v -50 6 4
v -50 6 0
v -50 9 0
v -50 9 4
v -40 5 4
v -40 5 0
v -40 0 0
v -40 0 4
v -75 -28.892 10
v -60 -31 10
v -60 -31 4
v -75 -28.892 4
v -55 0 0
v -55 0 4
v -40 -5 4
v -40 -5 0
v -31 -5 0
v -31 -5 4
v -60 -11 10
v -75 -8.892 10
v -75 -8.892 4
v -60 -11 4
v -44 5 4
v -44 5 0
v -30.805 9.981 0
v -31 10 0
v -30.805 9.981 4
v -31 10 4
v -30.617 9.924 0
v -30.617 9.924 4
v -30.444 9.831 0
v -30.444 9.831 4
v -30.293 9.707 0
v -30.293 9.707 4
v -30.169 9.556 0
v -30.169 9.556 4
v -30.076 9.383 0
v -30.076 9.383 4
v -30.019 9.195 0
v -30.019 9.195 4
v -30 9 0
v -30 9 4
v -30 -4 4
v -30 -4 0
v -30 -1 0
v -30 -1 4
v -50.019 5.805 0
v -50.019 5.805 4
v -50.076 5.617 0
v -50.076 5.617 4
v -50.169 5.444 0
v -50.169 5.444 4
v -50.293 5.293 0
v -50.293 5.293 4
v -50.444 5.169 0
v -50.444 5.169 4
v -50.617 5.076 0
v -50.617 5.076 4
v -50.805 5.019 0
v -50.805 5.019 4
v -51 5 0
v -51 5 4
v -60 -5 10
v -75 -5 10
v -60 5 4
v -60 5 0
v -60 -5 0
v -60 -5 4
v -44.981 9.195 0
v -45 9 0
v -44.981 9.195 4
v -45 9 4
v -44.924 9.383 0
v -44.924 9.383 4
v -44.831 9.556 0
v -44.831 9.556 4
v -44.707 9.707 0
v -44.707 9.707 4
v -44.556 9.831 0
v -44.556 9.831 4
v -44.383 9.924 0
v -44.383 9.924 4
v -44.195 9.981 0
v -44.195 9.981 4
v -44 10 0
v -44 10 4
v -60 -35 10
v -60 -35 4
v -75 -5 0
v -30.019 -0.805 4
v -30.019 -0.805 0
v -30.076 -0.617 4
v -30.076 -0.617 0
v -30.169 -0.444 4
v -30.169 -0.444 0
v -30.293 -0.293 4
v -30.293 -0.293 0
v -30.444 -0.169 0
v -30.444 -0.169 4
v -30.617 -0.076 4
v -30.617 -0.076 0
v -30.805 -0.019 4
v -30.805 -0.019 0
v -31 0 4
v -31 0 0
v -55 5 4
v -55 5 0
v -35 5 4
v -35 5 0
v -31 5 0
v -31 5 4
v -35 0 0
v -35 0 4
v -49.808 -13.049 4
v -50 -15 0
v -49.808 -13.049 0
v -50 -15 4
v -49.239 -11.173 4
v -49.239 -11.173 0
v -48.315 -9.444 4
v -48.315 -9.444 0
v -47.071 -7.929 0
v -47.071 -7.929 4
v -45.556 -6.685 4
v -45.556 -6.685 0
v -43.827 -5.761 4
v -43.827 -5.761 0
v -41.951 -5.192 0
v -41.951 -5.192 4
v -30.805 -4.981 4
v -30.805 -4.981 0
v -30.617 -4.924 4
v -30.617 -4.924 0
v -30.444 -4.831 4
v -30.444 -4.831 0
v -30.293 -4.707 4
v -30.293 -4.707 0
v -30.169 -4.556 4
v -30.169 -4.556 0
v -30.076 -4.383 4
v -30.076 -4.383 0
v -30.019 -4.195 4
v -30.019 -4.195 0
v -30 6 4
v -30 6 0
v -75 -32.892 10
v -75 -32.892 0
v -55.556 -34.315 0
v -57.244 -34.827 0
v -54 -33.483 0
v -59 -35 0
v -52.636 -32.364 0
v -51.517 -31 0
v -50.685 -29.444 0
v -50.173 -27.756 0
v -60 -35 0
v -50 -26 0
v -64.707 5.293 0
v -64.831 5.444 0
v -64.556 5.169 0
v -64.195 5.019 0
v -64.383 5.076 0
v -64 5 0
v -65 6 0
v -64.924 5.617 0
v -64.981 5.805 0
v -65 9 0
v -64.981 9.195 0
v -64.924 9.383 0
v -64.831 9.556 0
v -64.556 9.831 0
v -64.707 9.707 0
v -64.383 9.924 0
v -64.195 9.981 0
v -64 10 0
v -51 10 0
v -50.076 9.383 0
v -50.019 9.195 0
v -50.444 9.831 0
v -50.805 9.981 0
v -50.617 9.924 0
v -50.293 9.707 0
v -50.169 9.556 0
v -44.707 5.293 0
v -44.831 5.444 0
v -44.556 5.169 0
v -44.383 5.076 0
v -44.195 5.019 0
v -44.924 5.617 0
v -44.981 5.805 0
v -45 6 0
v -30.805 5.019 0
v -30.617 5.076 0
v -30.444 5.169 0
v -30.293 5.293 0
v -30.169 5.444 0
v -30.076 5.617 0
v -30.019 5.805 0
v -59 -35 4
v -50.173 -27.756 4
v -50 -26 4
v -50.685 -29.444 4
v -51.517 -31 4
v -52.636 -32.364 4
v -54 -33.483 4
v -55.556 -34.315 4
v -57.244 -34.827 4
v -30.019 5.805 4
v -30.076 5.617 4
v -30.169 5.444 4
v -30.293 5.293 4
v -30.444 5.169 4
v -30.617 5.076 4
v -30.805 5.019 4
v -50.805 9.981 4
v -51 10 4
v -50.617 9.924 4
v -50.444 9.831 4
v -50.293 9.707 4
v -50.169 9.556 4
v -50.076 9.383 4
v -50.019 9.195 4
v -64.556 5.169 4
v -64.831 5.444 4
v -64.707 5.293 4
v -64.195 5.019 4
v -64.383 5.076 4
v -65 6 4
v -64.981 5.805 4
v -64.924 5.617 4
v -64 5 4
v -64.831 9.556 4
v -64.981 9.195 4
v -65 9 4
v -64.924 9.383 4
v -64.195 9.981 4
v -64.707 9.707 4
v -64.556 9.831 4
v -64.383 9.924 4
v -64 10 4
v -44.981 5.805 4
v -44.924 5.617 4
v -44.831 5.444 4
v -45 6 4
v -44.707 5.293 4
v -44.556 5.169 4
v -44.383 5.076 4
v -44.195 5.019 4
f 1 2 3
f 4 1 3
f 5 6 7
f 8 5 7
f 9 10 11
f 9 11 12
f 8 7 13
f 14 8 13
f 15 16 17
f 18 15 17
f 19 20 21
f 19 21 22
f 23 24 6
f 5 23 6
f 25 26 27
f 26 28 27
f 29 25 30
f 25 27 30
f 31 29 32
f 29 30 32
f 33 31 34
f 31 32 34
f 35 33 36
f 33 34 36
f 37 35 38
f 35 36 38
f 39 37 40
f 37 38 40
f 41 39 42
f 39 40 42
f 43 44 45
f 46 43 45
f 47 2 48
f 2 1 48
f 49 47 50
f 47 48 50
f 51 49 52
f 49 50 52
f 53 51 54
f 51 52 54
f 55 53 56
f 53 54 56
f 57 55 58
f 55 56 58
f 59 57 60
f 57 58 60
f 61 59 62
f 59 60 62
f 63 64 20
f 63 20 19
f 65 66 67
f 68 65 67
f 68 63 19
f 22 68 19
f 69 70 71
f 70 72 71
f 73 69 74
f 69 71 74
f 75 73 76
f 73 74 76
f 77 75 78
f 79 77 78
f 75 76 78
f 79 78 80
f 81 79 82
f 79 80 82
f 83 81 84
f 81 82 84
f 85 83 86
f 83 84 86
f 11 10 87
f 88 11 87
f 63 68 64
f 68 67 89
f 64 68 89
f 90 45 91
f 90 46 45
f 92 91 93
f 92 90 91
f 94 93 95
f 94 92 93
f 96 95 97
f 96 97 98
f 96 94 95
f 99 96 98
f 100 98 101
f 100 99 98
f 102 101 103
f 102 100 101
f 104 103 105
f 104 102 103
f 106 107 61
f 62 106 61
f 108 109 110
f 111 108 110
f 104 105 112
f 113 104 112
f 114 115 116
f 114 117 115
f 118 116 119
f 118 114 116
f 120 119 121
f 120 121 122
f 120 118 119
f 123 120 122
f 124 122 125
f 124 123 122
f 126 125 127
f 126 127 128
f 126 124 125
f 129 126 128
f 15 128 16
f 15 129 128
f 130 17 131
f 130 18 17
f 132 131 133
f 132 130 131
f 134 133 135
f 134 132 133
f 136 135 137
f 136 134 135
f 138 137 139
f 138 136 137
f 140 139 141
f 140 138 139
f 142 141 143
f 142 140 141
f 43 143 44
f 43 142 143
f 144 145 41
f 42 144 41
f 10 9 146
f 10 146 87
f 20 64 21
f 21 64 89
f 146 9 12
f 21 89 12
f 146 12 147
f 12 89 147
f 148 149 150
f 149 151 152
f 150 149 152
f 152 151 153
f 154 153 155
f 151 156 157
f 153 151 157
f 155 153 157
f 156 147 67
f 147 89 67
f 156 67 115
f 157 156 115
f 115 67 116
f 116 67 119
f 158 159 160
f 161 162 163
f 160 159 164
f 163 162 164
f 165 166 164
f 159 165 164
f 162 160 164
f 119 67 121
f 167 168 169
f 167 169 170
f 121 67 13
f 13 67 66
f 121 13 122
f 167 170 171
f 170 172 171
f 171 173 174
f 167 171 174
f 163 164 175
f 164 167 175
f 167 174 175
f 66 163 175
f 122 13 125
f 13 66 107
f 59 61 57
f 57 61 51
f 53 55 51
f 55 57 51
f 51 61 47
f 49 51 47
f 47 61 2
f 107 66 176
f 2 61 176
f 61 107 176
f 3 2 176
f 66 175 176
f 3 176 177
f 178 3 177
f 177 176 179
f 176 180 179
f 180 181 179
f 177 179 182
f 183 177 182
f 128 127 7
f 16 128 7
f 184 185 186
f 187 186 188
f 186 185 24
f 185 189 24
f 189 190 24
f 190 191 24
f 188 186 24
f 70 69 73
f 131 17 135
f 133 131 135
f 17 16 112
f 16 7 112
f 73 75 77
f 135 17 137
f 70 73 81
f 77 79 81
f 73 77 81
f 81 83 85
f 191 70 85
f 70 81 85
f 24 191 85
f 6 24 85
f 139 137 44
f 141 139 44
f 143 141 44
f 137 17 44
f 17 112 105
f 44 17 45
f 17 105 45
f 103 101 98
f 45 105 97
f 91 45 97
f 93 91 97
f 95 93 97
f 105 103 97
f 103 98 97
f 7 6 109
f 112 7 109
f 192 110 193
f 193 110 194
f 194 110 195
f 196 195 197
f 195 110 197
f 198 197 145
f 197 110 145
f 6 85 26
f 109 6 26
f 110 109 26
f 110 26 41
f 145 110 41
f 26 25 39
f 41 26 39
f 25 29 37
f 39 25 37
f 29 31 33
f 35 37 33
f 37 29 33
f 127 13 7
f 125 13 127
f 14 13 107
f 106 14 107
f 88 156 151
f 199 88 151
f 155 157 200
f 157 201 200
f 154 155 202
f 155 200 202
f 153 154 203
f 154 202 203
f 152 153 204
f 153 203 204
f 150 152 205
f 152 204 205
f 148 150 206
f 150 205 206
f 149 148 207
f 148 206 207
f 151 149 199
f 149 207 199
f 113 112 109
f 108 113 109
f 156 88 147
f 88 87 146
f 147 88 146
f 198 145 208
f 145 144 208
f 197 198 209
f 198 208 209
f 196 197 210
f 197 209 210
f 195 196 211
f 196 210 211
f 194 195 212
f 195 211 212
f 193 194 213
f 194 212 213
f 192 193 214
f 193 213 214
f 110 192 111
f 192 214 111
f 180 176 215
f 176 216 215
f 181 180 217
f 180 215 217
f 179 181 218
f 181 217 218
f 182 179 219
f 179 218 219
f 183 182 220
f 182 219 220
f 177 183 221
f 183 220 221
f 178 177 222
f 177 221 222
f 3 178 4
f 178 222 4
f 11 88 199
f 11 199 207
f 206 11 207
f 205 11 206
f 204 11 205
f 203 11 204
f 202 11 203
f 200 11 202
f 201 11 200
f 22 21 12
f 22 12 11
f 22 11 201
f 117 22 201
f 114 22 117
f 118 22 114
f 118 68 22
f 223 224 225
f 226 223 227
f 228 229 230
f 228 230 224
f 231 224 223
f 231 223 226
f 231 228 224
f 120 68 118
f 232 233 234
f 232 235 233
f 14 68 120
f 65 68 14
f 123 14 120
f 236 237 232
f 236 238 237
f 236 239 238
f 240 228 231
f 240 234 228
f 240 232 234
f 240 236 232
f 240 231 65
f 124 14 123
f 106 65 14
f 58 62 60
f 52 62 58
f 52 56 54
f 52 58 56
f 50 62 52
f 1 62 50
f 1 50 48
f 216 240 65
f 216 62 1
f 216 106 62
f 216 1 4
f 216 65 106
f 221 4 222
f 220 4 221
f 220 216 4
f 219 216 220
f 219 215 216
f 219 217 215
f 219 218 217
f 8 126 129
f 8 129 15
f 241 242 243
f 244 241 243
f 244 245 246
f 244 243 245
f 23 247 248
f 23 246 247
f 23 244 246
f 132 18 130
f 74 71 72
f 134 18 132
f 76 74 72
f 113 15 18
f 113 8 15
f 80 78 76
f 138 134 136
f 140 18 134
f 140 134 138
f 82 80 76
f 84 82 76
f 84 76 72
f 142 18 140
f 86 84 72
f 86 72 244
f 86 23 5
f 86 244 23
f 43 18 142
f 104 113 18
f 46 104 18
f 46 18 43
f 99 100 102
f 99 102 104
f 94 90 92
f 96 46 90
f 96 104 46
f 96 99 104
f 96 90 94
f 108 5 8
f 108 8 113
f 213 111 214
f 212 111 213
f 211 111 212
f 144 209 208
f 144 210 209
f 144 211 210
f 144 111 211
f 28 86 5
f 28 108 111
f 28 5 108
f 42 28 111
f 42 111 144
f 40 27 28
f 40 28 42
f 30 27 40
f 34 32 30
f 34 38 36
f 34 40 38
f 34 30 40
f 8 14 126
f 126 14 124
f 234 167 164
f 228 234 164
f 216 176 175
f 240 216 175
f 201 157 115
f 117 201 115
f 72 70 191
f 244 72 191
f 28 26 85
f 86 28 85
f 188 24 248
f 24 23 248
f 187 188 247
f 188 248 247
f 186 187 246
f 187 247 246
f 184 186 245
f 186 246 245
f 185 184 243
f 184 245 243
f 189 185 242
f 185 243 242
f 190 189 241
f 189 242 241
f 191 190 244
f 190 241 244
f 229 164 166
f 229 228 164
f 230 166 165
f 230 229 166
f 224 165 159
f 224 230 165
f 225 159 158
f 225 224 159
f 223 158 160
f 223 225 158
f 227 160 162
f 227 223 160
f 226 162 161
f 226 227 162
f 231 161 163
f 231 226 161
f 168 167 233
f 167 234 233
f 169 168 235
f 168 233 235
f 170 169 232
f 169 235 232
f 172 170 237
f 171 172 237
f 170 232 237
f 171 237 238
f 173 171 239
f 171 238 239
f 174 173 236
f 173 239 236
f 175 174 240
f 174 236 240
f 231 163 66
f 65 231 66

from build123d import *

# Parameters (mm, degrees)
PAD_DEPTH       = 10
POCKET_DEPTH    = 6
POCKET001_DEPTH = 6
POCKET002_DEPTH = 11
FILLET_R        = 1
FILLET001_R     = 10
FILLET002_R     = 9
FILLET003_R     = 1


with BuildPart() as part:
    # Sketch → Pad (new body)
    with BuildSketch(Plane.XY):
        Polygon((-65, 10), (-65, 5), (-60, 5), (-60, -5), (-75, -5), (-75, -35), (-50, -35), (-50, -5), (-30, -5), (-30, 0), (-35, 0), (-35, 5), (-30, 5), (-30, 10), (-45, 10), (-45, 5), (-40, 5), (-40, 0), (-55, 0), (-55, 5), (-50, 5), (-50, 10), align=None)
    extrude(amount=PAD_DEPTH)

    # Sketch001 (on Face24 of Pad) → Pocket (cut)
    with BuildSketch(Plane.XY.offset(10)):
        Polygon((0, 15), (-80, 15), (-80, -5), (-60, -5), (-60, -35), (-50, -35), (-50, -5), (0, -5), align=None)
    extrude(amount=-POCKET_DEPTH, mode=Mode.SUBTRACT)

    # Sketch002 (on Face27 of Pocket) → Pocket001 (cut)
    with BuildSketch(Plane.XY.offset(10)):
        Polygon((-80, -8.189183), (-60, -11), (-60, -31), (-80, -28.189183), align=None)
    extrude(amount=-POCKET001_DEPTH, mode=Mode.SUBTRACT)

    # Sketch003 (on Face29 of Pocket001) → Pocket002 (cut)
    with BuildSketch(Plane.XY.offset(10)):
        Polygon((-60, -35), (-80, -32.189183), (-80, -40), (-60, -40), align=None)
    extrude(amount=-POCKET002_DEPTH, mode=Mode.SUBTRACT)

    # Fillet
    fillet_edges = [part.edges().sort_by_distance(p)[0] for p in [
        (-65, 5, 2),
        (-45, 5, 2),
        (-45, 10, 2),
        (-65, 10, 2),
        (-50, 10, 2),
        (-30, 10, 2),
        (-50, 5, 2),
        (-30, 5, 2),
    ]]
    fillet(fillet_edges, radius=FILLET_R)

    # Fillet001
    fillet001_edges = [part.edges().sort_by_distance(p)[0] for p in [
        (-50, -5, 2),
    ]]
    fillet(fillet001_edges, radius=FILLET001_R)

    # Fillet002
    fillet002_edges = [part.edges().sort_by_distance(p)[0] for p in [
        (-50, -35, 2),
    ]]
    fillet(fillet002_edges, radius=FILLET002_R)

    # Fillet003
    fillet003_edges = [part.edges().sort_by_distance(p)[0] for p in [
        (-30, -5, 2),
        (-30, 0, 2),
    ]]
    fillet(fillet003_edges, radius=FILLET003_R)


solid = part.part
